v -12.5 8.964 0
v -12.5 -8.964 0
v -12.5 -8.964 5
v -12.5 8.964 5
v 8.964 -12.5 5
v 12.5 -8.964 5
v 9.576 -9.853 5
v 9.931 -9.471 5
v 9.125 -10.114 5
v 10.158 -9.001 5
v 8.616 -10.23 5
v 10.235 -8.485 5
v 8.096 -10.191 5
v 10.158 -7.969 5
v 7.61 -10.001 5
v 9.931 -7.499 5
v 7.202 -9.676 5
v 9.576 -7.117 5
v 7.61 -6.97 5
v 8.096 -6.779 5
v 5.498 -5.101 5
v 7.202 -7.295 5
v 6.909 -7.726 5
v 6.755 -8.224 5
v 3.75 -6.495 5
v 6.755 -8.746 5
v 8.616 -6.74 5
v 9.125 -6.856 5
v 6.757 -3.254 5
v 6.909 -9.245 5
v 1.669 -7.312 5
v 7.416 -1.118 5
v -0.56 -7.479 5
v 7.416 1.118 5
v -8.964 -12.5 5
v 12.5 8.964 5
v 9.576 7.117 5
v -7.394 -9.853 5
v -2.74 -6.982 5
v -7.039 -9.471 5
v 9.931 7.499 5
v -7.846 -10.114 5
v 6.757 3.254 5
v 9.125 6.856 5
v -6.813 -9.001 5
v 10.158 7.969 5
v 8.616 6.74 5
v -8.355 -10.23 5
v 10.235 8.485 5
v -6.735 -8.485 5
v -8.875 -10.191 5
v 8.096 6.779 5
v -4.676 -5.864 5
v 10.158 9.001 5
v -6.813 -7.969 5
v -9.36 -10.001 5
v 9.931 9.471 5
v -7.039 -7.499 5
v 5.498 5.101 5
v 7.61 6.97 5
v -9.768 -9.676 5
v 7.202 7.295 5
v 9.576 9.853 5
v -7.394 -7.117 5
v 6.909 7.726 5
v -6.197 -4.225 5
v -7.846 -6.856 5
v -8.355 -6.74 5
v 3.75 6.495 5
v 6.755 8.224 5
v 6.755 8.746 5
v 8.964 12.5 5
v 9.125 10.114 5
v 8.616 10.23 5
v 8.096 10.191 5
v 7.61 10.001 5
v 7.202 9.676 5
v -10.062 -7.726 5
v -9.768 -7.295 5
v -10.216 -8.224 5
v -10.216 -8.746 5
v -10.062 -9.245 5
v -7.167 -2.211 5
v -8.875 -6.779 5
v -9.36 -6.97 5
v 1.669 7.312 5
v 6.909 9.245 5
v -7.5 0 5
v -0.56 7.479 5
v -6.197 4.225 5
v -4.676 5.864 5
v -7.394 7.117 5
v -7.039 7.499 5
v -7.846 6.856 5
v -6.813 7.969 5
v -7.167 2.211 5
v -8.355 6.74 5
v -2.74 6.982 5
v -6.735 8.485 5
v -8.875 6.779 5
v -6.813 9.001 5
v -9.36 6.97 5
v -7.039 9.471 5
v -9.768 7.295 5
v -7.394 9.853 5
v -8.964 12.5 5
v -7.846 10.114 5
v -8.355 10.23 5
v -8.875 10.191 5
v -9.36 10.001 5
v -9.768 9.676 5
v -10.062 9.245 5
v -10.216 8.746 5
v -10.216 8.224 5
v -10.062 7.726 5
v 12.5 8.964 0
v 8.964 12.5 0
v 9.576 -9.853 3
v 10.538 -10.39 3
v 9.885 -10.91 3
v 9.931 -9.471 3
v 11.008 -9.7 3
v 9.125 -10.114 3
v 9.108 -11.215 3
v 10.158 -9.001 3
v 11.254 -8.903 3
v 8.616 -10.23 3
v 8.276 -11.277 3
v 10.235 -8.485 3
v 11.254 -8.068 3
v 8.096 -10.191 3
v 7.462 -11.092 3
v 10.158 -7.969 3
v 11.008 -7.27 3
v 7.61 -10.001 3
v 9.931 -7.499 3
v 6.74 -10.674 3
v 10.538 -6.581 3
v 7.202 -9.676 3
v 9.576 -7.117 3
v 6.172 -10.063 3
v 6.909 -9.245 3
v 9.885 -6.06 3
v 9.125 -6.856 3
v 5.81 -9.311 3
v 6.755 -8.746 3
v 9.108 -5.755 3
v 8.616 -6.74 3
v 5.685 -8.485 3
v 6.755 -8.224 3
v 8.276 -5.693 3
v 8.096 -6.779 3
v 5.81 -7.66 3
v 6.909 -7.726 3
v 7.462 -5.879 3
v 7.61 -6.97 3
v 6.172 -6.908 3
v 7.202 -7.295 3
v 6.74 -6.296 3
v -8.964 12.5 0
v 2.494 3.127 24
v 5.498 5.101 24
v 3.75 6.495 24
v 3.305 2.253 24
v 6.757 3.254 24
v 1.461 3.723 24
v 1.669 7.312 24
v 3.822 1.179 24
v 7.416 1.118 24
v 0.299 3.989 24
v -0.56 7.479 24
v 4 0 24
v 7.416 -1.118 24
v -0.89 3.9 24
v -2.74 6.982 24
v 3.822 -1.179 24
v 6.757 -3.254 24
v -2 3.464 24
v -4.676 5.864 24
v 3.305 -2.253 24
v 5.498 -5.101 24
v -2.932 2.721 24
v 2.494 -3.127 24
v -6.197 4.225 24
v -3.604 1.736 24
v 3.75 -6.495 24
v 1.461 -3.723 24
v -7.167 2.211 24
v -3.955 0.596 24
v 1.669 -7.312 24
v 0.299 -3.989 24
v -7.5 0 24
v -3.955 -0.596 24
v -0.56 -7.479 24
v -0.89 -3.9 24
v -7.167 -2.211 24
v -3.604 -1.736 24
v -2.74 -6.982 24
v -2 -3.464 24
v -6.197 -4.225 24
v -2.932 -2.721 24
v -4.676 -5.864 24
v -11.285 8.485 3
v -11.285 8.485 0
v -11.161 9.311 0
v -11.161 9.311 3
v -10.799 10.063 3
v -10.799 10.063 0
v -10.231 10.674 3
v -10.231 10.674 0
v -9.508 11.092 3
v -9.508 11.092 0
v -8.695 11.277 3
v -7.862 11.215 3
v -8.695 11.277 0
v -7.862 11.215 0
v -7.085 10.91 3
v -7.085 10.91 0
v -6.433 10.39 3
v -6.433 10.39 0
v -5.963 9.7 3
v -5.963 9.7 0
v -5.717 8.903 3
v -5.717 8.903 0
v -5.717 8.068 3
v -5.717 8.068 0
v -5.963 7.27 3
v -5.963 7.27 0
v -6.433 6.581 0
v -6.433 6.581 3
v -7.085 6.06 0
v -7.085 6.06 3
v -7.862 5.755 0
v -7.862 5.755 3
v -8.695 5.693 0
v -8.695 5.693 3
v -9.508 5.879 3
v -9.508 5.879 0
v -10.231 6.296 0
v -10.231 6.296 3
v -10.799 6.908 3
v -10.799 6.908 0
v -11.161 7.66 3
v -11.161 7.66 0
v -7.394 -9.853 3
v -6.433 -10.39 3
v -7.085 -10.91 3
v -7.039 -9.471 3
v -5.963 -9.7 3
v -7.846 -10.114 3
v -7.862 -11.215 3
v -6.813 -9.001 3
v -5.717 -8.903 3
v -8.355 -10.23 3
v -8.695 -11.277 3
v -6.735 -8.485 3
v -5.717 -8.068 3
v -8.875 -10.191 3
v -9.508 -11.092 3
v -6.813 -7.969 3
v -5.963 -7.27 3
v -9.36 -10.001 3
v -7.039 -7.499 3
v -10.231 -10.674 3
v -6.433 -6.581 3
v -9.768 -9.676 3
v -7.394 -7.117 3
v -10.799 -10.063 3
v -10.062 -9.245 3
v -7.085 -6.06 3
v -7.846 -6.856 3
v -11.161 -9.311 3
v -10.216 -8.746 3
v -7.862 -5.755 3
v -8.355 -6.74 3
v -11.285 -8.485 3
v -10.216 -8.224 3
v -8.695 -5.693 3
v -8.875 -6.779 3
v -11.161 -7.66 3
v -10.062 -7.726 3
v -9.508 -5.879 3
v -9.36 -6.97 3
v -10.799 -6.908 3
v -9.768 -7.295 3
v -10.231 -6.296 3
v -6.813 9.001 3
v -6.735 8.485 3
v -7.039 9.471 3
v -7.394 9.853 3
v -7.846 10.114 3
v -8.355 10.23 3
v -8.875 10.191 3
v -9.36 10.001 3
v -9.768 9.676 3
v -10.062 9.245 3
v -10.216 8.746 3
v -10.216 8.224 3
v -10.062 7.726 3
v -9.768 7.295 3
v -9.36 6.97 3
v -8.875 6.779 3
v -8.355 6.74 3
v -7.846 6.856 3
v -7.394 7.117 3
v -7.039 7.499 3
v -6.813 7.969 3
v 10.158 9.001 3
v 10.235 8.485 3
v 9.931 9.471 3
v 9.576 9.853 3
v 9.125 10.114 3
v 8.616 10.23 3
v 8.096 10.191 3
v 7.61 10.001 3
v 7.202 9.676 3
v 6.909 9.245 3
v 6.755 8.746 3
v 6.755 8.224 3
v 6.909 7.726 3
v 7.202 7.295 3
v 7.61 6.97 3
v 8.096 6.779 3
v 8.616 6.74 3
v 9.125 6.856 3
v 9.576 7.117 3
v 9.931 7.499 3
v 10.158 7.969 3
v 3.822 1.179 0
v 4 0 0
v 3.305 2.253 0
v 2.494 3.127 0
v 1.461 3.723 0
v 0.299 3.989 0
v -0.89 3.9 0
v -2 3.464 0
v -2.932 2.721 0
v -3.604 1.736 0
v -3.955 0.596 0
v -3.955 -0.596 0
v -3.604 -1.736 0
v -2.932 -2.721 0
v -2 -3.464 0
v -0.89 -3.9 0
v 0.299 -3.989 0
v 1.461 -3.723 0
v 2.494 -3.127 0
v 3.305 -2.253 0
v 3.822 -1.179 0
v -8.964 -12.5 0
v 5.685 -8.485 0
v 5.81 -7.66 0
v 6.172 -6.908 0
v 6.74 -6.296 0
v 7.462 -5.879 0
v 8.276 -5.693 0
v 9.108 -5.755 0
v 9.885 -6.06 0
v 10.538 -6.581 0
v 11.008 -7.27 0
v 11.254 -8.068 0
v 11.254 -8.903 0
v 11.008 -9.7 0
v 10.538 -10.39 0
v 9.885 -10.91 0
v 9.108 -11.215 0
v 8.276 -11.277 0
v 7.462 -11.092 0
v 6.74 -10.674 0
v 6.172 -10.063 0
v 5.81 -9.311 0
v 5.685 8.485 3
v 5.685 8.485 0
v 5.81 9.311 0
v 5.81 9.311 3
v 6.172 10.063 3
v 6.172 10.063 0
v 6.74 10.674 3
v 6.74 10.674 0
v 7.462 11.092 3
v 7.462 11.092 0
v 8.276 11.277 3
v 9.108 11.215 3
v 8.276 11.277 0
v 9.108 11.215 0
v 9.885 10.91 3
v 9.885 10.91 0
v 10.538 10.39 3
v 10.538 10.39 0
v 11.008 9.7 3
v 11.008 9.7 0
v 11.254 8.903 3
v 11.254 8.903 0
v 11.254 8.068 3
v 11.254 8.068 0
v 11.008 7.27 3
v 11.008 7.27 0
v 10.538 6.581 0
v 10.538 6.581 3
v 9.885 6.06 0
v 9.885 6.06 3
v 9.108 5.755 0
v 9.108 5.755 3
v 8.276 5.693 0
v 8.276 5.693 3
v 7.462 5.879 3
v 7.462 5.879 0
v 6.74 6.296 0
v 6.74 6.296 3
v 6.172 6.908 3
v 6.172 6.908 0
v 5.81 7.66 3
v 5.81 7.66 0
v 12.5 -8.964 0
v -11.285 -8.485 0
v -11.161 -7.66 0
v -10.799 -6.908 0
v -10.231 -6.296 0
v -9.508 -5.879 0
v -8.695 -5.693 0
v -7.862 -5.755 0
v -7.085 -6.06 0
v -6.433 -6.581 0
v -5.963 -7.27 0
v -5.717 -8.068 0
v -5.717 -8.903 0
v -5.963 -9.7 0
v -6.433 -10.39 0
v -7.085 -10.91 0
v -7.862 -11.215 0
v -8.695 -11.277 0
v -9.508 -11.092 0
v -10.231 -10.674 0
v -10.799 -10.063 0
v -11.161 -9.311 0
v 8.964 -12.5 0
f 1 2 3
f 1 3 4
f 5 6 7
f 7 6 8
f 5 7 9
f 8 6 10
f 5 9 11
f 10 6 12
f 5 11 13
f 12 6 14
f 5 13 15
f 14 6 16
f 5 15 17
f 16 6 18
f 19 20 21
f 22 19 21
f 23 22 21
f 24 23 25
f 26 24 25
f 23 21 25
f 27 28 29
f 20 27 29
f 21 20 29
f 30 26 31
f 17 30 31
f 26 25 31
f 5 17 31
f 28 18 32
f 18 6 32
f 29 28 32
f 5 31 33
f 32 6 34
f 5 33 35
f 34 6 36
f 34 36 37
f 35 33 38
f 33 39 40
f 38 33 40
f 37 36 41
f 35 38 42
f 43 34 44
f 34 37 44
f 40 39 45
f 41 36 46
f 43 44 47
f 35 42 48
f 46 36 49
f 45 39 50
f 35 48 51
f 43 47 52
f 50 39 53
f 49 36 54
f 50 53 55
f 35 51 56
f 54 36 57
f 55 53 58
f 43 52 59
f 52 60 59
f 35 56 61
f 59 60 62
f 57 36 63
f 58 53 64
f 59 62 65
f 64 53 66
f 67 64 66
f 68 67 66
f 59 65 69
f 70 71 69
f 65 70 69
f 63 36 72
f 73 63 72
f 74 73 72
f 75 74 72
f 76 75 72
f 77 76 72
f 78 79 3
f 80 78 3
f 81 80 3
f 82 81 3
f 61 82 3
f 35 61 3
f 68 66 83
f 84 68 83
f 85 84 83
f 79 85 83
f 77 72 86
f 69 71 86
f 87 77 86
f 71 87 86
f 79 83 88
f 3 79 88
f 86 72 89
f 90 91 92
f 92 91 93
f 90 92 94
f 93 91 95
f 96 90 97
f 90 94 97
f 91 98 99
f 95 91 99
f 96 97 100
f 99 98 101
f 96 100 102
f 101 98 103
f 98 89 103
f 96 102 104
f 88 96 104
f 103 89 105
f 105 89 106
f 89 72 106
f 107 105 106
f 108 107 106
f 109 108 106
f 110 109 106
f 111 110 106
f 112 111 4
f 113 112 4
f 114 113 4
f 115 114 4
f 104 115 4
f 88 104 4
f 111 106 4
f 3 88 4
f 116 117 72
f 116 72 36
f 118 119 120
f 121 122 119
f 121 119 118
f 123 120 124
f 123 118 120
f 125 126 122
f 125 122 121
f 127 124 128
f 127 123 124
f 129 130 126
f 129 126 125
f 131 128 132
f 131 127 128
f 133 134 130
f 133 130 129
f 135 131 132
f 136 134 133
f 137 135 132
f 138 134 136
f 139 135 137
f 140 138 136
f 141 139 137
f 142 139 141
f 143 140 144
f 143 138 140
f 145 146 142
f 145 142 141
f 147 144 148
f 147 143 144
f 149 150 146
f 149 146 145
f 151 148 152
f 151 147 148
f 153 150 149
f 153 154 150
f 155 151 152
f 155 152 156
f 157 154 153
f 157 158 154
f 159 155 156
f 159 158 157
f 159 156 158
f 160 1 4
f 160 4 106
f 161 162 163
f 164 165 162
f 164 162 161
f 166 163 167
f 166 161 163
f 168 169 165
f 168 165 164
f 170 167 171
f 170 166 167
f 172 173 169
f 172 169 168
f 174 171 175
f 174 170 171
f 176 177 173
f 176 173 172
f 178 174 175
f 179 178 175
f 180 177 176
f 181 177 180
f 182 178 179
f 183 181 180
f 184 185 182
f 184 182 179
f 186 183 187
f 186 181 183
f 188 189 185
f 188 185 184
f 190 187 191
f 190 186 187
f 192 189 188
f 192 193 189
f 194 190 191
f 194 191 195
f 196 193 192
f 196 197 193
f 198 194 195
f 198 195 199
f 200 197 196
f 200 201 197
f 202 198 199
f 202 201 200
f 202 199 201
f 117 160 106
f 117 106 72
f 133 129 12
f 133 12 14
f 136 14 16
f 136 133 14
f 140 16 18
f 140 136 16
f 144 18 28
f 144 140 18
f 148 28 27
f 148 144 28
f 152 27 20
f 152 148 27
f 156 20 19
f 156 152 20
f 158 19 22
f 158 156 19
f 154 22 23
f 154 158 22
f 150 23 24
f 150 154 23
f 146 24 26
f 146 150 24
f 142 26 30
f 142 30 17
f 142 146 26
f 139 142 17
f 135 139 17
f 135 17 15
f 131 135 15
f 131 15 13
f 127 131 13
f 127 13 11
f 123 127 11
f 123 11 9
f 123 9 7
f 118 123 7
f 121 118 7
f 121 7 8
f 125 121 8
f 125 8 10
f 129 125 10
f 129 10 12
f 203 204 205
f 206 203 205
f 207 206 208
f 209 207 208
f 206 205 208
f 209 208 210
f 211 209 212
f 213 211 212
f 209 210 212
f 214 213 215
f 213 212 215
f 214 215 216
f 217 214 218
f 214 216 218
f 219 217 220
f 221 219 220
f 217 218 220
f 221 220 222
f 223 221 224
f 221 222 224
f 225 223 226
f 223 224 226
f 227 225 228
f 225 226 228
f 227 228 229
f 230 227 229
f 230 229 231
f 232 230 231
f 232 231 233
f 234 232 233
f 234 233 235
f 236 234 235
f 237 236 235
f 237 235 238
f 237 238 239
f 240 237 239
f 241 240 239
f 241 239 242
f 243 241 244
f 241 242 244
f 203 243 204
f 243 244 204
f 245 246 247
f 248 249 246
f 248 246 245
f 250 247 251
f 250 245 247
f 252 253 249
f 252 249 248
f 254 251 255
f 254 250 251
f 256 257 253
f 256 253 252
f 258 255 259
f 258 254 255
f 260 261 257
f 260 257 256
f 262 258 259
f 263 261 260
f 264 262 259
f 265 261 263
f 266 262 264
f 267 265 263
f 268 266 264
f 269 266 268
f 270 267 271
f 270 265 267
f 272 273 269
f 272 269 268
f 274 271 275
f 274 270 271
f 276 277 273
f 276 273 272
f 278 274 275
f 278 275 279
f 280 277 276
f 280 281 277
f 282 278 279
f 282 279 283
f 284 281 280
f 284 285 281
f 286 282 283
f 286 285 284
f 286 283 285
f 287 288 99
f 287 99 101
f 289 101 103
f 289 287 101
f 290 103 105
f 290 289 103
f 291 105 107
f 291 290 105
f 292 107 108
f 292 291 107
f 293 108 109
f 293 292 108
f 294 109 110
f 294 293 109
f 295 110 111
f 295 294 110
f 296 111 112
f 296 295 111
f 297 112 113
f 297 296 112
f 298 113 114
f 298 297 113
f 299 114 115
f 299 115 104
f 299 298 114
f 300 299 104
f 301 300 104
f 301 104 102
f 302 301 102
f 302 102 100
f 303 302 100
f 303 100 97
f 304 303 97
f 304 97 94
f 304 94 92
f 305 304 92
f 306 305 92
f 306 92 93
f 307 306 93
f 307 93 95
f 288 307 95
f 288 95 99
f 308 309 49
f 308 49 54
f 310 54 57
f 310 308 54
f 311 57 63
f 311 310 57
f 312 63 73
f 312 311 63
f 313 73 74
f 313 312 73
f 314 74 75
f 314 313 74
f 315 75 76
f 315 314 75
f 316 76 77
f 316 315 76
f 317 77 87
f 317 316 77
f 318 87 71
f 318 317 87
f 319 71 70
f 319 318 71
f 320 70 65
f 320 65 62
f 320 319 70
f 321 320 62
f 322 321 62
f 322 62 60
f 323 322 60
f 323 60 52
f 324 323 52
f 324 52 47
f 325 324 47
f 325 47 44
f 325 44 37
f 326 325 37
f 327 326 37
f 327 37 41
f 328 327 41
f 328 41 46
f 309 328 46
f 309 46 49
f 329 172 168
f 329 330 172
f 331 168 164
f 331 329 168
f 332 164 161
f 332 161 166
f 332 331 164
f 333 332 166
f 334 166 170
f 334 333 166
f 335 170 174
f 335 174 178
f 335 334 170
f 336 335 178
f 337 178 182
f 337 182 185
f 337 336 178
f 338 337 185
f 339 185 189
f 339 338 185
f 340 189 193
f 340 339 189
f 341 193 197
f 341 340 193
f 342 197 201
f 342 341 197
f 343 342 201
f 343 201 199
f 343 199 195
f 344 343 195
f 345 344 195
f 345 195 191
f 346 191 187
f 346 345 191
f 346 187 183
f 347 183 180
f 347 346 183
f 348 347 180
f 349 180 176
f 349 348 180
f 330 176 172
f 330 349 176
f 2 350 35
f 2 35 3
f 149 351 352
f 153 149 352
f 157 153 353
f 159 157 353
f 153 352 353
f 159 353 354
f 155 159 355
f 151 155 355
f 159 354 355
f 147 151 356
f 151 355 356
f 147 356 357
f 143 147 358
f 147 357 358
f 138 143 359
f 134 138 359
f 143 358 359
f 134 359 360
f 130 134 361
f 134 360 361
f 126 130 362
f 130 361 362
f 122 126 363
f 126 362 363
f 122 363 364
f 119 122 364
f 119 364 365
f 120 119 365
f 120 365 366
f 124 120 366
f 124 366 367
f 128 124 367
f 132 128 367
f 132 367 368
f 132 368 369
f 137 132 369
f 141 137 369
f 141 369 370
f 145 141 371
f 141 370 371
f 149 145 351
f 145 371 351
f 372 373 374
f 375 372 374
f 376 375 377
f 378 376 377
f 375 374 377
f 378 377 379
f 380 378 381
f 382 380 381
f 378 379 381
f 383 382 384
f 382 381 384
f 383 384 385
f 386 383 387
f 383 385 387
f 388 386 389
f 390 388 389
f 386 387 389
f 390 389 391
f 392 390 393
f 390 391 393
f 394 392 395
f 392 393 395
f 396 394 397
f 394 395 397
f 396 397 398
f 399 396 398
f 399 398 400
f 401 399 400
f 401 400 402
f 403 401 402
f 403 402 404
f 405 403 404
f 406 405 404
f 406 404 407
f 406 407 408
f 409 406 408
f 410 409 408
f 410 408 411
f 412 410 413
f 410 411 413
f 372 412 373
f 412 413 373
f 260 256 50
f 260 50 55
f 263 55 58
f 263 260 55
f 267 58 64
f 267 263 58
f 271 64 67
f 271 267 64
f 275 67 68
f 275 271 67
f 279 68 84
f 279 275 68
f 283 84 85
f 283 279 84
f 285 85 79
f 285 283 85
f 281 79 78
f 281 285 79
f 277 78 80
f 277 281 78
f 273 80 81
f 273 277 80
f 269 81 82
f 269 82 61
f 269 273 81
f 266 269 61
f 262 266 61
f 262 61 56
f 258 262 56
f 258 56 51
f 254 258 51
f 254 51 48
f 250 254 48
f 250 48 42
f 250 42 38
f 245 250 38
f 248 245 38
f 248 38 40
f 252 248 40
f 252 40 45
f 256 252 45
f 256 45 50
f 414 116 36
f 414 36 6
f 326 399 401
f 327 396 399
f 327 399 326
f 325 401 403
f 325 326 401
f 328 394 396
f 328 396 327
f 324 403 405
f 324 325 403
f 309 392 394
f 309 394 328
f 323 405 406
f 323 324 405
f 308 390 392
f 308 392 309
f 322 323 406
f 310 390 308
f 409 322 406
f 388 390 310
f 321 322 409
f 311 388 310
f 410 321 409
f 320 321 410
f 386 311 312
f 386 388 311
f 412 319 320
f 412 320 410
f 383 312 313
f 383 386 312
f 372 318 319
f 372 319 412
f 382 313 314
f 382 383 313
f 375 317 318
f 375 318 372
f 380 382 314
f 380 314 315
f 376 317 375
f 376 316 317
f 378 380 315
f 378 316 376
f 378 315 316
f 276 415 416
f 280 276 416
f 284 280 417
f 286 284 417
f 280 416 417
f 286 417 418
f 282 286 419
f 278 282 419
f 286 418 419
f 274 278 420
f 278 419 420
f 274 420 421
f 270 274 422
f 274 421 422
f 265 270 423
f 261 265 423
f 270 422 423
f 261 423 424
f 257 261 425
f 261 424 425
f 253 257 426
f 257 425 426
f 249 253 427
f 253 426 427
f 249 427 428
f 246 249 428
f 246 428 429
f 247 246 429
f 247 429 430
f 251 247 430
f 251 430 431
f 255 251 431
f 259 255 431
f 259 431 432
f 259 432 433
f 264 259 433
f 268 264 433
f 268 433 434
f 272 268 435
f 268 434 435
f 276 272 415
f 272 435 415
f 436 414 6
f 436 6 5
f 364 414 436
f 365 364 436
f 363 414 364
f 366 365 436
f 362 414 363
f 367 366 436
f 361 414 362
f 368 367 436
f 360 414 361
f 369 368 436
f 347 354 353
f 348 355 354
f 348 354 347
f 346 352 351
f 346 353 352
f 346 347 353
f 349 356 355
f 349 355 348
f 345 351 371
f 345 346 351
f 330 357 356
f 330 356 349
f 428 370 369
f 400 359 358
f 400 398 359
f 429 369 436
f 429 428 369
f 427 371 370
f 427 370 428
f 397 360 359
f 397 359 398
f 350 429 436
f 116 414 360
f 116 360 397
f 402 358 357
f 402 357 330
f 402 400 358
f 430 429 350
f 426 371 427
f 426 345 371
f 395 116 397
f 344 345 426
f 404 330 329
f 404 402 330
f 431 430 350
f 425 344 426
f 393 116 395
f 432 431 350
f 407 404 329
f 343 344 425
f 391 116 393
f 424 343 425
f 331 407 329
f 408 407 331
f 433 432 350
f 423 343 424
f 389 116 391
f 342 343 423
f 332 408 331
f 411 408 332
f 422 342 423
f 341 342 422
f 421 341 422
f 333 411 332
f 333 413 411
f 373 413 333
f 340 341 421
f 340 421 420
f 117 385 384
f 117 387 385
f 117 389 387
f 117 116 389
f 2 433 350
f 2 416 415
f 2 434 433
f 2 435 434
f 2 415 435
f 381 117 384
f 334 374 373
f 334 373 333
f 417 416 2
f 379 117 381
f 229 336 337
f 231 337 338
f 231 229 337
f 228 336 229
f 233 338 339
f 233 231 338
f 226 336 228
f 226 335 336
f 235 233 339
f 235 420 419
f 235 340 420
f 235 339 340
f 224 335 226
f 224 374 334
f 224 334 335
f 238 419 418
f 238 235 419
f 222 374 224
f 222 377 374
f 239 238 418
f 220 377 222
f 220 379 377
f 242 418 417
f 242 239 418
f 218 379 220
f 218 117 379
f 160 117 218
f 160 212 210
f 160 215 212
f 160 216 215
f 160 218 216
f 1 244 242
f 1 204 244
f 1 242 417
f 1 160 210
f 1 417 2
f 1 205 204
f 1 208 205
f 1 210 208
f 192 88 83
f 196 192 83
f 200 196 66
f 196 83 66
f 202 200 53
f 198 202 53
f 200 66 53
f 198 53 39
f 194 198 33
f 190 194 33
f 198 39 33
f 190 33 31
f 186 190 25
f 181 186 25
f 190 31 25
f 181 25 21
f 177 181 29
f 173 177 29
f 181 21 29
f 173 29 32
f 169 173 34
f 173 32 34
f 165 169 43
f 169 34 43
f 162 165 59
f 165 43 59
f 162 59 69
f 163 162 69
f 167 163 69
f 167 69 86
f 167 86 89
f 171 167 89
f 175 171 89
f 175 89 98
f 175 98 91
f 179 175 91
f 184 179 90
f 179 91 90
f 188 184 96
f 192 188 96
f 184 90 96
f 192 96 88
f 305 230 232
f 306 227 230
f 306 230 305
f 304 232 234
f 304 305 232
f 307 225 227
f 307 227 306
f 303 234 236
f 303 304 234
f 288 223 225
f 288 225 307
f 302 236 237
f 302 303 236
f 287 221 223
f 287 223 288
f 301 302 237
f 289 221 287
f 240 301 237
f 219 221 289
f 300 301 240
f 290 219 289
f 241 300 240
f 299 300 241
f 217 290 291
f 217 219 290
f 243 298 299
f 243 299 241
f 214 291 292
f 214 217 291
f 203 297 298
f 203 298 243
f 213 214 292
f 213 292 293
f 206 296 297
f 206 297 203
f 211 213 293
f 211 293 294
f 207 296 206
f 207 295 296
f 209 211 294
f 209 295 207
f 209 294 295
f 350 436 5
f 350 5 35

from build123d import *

# Parameters (mm, degrees)
SKETCH2_R           = 1.75
SKETCH2_R_2         = 4
BOSS_EXTRUDE1_DEPTH = 5
SKETCH3_R           = 7.5
SKETCH3_R_2         = 4
BOSS_EXTRUDE2_DEPTH = 19
SKETCH4_R           = 2.8
CUT_EXTRUDE1_DEPTH  = 3


with BuildPart() as part:
    # Sketch2 → Boss-Extrude1 (new body)
    with BuildSketch(Plane.XY):
        Polygon((-8.964466094, 12.5), (8.964466094, 12.5), (12.5, 8.964466094), (12.5, -8.964466094), (8.964466094, -12.5), (-8.964466094, -12.5), (-12.5, -8.964466094), (-12.5, 8.964466094), align=None)
        with Locations((-8.485281374, 8.485281374)):
            Circle(SKETCH2_R, mode=Mode.SUBTRACT)
        with Locations((8.485281374, -8.485281374)):
            Circle(SKETCH2_R, mode=Mode.SUBTRACT)
        with Locations((8.485281374, 8.485281374)):
            Circle(SKETCH2_R, mode=Mode.SUBTRACT)
        with Locations((-8.485281374, -8.485281374)):
            Circle(SKETCH2_R, mode=Mode.SUBTRACT)
        Circle(SKETCH2_R_2, mode=Mode.SUBTRACT)
    extrude(amount=BOSS_EXTRUDE1_DEPTH)

    # Sketch3 → Boss-Extrude2 (add)
    with BuildSketch(Plane.XY.offset(5)):
        Circle(SKETCH3_R)
        Circle(SKETCH3_R_2, mode=Mode.SUBTRACT)
    extrude(amount=BOSS_EXTRUDE2_DEPTH)

    # Sketch4 → Cut-Extrude1 (cut)
    with BuildSketch(Plane(origin=(0, 0, 0), x_dir=(-1, 0, 0), z_dir=(0, 0, -1))):
        with Locations((-8.485281374, 8.485281374)):
            Circle(SKETCH4_R)
        with Locations((8.485281374, 8.485281374)):
            Circle(SKETCH4_R)
        with Locations((8.485281374, -8.485281374)):
            Circle(SKETCH4_R)
        with Locations((-8.485281374, -8.485281374)):
            Circle(SKETCH4_R)
    extrude(amount=-CUT_EXTRUDE1_DEPTH, mode=Mode.SUBTRACT)


solid = part.part
